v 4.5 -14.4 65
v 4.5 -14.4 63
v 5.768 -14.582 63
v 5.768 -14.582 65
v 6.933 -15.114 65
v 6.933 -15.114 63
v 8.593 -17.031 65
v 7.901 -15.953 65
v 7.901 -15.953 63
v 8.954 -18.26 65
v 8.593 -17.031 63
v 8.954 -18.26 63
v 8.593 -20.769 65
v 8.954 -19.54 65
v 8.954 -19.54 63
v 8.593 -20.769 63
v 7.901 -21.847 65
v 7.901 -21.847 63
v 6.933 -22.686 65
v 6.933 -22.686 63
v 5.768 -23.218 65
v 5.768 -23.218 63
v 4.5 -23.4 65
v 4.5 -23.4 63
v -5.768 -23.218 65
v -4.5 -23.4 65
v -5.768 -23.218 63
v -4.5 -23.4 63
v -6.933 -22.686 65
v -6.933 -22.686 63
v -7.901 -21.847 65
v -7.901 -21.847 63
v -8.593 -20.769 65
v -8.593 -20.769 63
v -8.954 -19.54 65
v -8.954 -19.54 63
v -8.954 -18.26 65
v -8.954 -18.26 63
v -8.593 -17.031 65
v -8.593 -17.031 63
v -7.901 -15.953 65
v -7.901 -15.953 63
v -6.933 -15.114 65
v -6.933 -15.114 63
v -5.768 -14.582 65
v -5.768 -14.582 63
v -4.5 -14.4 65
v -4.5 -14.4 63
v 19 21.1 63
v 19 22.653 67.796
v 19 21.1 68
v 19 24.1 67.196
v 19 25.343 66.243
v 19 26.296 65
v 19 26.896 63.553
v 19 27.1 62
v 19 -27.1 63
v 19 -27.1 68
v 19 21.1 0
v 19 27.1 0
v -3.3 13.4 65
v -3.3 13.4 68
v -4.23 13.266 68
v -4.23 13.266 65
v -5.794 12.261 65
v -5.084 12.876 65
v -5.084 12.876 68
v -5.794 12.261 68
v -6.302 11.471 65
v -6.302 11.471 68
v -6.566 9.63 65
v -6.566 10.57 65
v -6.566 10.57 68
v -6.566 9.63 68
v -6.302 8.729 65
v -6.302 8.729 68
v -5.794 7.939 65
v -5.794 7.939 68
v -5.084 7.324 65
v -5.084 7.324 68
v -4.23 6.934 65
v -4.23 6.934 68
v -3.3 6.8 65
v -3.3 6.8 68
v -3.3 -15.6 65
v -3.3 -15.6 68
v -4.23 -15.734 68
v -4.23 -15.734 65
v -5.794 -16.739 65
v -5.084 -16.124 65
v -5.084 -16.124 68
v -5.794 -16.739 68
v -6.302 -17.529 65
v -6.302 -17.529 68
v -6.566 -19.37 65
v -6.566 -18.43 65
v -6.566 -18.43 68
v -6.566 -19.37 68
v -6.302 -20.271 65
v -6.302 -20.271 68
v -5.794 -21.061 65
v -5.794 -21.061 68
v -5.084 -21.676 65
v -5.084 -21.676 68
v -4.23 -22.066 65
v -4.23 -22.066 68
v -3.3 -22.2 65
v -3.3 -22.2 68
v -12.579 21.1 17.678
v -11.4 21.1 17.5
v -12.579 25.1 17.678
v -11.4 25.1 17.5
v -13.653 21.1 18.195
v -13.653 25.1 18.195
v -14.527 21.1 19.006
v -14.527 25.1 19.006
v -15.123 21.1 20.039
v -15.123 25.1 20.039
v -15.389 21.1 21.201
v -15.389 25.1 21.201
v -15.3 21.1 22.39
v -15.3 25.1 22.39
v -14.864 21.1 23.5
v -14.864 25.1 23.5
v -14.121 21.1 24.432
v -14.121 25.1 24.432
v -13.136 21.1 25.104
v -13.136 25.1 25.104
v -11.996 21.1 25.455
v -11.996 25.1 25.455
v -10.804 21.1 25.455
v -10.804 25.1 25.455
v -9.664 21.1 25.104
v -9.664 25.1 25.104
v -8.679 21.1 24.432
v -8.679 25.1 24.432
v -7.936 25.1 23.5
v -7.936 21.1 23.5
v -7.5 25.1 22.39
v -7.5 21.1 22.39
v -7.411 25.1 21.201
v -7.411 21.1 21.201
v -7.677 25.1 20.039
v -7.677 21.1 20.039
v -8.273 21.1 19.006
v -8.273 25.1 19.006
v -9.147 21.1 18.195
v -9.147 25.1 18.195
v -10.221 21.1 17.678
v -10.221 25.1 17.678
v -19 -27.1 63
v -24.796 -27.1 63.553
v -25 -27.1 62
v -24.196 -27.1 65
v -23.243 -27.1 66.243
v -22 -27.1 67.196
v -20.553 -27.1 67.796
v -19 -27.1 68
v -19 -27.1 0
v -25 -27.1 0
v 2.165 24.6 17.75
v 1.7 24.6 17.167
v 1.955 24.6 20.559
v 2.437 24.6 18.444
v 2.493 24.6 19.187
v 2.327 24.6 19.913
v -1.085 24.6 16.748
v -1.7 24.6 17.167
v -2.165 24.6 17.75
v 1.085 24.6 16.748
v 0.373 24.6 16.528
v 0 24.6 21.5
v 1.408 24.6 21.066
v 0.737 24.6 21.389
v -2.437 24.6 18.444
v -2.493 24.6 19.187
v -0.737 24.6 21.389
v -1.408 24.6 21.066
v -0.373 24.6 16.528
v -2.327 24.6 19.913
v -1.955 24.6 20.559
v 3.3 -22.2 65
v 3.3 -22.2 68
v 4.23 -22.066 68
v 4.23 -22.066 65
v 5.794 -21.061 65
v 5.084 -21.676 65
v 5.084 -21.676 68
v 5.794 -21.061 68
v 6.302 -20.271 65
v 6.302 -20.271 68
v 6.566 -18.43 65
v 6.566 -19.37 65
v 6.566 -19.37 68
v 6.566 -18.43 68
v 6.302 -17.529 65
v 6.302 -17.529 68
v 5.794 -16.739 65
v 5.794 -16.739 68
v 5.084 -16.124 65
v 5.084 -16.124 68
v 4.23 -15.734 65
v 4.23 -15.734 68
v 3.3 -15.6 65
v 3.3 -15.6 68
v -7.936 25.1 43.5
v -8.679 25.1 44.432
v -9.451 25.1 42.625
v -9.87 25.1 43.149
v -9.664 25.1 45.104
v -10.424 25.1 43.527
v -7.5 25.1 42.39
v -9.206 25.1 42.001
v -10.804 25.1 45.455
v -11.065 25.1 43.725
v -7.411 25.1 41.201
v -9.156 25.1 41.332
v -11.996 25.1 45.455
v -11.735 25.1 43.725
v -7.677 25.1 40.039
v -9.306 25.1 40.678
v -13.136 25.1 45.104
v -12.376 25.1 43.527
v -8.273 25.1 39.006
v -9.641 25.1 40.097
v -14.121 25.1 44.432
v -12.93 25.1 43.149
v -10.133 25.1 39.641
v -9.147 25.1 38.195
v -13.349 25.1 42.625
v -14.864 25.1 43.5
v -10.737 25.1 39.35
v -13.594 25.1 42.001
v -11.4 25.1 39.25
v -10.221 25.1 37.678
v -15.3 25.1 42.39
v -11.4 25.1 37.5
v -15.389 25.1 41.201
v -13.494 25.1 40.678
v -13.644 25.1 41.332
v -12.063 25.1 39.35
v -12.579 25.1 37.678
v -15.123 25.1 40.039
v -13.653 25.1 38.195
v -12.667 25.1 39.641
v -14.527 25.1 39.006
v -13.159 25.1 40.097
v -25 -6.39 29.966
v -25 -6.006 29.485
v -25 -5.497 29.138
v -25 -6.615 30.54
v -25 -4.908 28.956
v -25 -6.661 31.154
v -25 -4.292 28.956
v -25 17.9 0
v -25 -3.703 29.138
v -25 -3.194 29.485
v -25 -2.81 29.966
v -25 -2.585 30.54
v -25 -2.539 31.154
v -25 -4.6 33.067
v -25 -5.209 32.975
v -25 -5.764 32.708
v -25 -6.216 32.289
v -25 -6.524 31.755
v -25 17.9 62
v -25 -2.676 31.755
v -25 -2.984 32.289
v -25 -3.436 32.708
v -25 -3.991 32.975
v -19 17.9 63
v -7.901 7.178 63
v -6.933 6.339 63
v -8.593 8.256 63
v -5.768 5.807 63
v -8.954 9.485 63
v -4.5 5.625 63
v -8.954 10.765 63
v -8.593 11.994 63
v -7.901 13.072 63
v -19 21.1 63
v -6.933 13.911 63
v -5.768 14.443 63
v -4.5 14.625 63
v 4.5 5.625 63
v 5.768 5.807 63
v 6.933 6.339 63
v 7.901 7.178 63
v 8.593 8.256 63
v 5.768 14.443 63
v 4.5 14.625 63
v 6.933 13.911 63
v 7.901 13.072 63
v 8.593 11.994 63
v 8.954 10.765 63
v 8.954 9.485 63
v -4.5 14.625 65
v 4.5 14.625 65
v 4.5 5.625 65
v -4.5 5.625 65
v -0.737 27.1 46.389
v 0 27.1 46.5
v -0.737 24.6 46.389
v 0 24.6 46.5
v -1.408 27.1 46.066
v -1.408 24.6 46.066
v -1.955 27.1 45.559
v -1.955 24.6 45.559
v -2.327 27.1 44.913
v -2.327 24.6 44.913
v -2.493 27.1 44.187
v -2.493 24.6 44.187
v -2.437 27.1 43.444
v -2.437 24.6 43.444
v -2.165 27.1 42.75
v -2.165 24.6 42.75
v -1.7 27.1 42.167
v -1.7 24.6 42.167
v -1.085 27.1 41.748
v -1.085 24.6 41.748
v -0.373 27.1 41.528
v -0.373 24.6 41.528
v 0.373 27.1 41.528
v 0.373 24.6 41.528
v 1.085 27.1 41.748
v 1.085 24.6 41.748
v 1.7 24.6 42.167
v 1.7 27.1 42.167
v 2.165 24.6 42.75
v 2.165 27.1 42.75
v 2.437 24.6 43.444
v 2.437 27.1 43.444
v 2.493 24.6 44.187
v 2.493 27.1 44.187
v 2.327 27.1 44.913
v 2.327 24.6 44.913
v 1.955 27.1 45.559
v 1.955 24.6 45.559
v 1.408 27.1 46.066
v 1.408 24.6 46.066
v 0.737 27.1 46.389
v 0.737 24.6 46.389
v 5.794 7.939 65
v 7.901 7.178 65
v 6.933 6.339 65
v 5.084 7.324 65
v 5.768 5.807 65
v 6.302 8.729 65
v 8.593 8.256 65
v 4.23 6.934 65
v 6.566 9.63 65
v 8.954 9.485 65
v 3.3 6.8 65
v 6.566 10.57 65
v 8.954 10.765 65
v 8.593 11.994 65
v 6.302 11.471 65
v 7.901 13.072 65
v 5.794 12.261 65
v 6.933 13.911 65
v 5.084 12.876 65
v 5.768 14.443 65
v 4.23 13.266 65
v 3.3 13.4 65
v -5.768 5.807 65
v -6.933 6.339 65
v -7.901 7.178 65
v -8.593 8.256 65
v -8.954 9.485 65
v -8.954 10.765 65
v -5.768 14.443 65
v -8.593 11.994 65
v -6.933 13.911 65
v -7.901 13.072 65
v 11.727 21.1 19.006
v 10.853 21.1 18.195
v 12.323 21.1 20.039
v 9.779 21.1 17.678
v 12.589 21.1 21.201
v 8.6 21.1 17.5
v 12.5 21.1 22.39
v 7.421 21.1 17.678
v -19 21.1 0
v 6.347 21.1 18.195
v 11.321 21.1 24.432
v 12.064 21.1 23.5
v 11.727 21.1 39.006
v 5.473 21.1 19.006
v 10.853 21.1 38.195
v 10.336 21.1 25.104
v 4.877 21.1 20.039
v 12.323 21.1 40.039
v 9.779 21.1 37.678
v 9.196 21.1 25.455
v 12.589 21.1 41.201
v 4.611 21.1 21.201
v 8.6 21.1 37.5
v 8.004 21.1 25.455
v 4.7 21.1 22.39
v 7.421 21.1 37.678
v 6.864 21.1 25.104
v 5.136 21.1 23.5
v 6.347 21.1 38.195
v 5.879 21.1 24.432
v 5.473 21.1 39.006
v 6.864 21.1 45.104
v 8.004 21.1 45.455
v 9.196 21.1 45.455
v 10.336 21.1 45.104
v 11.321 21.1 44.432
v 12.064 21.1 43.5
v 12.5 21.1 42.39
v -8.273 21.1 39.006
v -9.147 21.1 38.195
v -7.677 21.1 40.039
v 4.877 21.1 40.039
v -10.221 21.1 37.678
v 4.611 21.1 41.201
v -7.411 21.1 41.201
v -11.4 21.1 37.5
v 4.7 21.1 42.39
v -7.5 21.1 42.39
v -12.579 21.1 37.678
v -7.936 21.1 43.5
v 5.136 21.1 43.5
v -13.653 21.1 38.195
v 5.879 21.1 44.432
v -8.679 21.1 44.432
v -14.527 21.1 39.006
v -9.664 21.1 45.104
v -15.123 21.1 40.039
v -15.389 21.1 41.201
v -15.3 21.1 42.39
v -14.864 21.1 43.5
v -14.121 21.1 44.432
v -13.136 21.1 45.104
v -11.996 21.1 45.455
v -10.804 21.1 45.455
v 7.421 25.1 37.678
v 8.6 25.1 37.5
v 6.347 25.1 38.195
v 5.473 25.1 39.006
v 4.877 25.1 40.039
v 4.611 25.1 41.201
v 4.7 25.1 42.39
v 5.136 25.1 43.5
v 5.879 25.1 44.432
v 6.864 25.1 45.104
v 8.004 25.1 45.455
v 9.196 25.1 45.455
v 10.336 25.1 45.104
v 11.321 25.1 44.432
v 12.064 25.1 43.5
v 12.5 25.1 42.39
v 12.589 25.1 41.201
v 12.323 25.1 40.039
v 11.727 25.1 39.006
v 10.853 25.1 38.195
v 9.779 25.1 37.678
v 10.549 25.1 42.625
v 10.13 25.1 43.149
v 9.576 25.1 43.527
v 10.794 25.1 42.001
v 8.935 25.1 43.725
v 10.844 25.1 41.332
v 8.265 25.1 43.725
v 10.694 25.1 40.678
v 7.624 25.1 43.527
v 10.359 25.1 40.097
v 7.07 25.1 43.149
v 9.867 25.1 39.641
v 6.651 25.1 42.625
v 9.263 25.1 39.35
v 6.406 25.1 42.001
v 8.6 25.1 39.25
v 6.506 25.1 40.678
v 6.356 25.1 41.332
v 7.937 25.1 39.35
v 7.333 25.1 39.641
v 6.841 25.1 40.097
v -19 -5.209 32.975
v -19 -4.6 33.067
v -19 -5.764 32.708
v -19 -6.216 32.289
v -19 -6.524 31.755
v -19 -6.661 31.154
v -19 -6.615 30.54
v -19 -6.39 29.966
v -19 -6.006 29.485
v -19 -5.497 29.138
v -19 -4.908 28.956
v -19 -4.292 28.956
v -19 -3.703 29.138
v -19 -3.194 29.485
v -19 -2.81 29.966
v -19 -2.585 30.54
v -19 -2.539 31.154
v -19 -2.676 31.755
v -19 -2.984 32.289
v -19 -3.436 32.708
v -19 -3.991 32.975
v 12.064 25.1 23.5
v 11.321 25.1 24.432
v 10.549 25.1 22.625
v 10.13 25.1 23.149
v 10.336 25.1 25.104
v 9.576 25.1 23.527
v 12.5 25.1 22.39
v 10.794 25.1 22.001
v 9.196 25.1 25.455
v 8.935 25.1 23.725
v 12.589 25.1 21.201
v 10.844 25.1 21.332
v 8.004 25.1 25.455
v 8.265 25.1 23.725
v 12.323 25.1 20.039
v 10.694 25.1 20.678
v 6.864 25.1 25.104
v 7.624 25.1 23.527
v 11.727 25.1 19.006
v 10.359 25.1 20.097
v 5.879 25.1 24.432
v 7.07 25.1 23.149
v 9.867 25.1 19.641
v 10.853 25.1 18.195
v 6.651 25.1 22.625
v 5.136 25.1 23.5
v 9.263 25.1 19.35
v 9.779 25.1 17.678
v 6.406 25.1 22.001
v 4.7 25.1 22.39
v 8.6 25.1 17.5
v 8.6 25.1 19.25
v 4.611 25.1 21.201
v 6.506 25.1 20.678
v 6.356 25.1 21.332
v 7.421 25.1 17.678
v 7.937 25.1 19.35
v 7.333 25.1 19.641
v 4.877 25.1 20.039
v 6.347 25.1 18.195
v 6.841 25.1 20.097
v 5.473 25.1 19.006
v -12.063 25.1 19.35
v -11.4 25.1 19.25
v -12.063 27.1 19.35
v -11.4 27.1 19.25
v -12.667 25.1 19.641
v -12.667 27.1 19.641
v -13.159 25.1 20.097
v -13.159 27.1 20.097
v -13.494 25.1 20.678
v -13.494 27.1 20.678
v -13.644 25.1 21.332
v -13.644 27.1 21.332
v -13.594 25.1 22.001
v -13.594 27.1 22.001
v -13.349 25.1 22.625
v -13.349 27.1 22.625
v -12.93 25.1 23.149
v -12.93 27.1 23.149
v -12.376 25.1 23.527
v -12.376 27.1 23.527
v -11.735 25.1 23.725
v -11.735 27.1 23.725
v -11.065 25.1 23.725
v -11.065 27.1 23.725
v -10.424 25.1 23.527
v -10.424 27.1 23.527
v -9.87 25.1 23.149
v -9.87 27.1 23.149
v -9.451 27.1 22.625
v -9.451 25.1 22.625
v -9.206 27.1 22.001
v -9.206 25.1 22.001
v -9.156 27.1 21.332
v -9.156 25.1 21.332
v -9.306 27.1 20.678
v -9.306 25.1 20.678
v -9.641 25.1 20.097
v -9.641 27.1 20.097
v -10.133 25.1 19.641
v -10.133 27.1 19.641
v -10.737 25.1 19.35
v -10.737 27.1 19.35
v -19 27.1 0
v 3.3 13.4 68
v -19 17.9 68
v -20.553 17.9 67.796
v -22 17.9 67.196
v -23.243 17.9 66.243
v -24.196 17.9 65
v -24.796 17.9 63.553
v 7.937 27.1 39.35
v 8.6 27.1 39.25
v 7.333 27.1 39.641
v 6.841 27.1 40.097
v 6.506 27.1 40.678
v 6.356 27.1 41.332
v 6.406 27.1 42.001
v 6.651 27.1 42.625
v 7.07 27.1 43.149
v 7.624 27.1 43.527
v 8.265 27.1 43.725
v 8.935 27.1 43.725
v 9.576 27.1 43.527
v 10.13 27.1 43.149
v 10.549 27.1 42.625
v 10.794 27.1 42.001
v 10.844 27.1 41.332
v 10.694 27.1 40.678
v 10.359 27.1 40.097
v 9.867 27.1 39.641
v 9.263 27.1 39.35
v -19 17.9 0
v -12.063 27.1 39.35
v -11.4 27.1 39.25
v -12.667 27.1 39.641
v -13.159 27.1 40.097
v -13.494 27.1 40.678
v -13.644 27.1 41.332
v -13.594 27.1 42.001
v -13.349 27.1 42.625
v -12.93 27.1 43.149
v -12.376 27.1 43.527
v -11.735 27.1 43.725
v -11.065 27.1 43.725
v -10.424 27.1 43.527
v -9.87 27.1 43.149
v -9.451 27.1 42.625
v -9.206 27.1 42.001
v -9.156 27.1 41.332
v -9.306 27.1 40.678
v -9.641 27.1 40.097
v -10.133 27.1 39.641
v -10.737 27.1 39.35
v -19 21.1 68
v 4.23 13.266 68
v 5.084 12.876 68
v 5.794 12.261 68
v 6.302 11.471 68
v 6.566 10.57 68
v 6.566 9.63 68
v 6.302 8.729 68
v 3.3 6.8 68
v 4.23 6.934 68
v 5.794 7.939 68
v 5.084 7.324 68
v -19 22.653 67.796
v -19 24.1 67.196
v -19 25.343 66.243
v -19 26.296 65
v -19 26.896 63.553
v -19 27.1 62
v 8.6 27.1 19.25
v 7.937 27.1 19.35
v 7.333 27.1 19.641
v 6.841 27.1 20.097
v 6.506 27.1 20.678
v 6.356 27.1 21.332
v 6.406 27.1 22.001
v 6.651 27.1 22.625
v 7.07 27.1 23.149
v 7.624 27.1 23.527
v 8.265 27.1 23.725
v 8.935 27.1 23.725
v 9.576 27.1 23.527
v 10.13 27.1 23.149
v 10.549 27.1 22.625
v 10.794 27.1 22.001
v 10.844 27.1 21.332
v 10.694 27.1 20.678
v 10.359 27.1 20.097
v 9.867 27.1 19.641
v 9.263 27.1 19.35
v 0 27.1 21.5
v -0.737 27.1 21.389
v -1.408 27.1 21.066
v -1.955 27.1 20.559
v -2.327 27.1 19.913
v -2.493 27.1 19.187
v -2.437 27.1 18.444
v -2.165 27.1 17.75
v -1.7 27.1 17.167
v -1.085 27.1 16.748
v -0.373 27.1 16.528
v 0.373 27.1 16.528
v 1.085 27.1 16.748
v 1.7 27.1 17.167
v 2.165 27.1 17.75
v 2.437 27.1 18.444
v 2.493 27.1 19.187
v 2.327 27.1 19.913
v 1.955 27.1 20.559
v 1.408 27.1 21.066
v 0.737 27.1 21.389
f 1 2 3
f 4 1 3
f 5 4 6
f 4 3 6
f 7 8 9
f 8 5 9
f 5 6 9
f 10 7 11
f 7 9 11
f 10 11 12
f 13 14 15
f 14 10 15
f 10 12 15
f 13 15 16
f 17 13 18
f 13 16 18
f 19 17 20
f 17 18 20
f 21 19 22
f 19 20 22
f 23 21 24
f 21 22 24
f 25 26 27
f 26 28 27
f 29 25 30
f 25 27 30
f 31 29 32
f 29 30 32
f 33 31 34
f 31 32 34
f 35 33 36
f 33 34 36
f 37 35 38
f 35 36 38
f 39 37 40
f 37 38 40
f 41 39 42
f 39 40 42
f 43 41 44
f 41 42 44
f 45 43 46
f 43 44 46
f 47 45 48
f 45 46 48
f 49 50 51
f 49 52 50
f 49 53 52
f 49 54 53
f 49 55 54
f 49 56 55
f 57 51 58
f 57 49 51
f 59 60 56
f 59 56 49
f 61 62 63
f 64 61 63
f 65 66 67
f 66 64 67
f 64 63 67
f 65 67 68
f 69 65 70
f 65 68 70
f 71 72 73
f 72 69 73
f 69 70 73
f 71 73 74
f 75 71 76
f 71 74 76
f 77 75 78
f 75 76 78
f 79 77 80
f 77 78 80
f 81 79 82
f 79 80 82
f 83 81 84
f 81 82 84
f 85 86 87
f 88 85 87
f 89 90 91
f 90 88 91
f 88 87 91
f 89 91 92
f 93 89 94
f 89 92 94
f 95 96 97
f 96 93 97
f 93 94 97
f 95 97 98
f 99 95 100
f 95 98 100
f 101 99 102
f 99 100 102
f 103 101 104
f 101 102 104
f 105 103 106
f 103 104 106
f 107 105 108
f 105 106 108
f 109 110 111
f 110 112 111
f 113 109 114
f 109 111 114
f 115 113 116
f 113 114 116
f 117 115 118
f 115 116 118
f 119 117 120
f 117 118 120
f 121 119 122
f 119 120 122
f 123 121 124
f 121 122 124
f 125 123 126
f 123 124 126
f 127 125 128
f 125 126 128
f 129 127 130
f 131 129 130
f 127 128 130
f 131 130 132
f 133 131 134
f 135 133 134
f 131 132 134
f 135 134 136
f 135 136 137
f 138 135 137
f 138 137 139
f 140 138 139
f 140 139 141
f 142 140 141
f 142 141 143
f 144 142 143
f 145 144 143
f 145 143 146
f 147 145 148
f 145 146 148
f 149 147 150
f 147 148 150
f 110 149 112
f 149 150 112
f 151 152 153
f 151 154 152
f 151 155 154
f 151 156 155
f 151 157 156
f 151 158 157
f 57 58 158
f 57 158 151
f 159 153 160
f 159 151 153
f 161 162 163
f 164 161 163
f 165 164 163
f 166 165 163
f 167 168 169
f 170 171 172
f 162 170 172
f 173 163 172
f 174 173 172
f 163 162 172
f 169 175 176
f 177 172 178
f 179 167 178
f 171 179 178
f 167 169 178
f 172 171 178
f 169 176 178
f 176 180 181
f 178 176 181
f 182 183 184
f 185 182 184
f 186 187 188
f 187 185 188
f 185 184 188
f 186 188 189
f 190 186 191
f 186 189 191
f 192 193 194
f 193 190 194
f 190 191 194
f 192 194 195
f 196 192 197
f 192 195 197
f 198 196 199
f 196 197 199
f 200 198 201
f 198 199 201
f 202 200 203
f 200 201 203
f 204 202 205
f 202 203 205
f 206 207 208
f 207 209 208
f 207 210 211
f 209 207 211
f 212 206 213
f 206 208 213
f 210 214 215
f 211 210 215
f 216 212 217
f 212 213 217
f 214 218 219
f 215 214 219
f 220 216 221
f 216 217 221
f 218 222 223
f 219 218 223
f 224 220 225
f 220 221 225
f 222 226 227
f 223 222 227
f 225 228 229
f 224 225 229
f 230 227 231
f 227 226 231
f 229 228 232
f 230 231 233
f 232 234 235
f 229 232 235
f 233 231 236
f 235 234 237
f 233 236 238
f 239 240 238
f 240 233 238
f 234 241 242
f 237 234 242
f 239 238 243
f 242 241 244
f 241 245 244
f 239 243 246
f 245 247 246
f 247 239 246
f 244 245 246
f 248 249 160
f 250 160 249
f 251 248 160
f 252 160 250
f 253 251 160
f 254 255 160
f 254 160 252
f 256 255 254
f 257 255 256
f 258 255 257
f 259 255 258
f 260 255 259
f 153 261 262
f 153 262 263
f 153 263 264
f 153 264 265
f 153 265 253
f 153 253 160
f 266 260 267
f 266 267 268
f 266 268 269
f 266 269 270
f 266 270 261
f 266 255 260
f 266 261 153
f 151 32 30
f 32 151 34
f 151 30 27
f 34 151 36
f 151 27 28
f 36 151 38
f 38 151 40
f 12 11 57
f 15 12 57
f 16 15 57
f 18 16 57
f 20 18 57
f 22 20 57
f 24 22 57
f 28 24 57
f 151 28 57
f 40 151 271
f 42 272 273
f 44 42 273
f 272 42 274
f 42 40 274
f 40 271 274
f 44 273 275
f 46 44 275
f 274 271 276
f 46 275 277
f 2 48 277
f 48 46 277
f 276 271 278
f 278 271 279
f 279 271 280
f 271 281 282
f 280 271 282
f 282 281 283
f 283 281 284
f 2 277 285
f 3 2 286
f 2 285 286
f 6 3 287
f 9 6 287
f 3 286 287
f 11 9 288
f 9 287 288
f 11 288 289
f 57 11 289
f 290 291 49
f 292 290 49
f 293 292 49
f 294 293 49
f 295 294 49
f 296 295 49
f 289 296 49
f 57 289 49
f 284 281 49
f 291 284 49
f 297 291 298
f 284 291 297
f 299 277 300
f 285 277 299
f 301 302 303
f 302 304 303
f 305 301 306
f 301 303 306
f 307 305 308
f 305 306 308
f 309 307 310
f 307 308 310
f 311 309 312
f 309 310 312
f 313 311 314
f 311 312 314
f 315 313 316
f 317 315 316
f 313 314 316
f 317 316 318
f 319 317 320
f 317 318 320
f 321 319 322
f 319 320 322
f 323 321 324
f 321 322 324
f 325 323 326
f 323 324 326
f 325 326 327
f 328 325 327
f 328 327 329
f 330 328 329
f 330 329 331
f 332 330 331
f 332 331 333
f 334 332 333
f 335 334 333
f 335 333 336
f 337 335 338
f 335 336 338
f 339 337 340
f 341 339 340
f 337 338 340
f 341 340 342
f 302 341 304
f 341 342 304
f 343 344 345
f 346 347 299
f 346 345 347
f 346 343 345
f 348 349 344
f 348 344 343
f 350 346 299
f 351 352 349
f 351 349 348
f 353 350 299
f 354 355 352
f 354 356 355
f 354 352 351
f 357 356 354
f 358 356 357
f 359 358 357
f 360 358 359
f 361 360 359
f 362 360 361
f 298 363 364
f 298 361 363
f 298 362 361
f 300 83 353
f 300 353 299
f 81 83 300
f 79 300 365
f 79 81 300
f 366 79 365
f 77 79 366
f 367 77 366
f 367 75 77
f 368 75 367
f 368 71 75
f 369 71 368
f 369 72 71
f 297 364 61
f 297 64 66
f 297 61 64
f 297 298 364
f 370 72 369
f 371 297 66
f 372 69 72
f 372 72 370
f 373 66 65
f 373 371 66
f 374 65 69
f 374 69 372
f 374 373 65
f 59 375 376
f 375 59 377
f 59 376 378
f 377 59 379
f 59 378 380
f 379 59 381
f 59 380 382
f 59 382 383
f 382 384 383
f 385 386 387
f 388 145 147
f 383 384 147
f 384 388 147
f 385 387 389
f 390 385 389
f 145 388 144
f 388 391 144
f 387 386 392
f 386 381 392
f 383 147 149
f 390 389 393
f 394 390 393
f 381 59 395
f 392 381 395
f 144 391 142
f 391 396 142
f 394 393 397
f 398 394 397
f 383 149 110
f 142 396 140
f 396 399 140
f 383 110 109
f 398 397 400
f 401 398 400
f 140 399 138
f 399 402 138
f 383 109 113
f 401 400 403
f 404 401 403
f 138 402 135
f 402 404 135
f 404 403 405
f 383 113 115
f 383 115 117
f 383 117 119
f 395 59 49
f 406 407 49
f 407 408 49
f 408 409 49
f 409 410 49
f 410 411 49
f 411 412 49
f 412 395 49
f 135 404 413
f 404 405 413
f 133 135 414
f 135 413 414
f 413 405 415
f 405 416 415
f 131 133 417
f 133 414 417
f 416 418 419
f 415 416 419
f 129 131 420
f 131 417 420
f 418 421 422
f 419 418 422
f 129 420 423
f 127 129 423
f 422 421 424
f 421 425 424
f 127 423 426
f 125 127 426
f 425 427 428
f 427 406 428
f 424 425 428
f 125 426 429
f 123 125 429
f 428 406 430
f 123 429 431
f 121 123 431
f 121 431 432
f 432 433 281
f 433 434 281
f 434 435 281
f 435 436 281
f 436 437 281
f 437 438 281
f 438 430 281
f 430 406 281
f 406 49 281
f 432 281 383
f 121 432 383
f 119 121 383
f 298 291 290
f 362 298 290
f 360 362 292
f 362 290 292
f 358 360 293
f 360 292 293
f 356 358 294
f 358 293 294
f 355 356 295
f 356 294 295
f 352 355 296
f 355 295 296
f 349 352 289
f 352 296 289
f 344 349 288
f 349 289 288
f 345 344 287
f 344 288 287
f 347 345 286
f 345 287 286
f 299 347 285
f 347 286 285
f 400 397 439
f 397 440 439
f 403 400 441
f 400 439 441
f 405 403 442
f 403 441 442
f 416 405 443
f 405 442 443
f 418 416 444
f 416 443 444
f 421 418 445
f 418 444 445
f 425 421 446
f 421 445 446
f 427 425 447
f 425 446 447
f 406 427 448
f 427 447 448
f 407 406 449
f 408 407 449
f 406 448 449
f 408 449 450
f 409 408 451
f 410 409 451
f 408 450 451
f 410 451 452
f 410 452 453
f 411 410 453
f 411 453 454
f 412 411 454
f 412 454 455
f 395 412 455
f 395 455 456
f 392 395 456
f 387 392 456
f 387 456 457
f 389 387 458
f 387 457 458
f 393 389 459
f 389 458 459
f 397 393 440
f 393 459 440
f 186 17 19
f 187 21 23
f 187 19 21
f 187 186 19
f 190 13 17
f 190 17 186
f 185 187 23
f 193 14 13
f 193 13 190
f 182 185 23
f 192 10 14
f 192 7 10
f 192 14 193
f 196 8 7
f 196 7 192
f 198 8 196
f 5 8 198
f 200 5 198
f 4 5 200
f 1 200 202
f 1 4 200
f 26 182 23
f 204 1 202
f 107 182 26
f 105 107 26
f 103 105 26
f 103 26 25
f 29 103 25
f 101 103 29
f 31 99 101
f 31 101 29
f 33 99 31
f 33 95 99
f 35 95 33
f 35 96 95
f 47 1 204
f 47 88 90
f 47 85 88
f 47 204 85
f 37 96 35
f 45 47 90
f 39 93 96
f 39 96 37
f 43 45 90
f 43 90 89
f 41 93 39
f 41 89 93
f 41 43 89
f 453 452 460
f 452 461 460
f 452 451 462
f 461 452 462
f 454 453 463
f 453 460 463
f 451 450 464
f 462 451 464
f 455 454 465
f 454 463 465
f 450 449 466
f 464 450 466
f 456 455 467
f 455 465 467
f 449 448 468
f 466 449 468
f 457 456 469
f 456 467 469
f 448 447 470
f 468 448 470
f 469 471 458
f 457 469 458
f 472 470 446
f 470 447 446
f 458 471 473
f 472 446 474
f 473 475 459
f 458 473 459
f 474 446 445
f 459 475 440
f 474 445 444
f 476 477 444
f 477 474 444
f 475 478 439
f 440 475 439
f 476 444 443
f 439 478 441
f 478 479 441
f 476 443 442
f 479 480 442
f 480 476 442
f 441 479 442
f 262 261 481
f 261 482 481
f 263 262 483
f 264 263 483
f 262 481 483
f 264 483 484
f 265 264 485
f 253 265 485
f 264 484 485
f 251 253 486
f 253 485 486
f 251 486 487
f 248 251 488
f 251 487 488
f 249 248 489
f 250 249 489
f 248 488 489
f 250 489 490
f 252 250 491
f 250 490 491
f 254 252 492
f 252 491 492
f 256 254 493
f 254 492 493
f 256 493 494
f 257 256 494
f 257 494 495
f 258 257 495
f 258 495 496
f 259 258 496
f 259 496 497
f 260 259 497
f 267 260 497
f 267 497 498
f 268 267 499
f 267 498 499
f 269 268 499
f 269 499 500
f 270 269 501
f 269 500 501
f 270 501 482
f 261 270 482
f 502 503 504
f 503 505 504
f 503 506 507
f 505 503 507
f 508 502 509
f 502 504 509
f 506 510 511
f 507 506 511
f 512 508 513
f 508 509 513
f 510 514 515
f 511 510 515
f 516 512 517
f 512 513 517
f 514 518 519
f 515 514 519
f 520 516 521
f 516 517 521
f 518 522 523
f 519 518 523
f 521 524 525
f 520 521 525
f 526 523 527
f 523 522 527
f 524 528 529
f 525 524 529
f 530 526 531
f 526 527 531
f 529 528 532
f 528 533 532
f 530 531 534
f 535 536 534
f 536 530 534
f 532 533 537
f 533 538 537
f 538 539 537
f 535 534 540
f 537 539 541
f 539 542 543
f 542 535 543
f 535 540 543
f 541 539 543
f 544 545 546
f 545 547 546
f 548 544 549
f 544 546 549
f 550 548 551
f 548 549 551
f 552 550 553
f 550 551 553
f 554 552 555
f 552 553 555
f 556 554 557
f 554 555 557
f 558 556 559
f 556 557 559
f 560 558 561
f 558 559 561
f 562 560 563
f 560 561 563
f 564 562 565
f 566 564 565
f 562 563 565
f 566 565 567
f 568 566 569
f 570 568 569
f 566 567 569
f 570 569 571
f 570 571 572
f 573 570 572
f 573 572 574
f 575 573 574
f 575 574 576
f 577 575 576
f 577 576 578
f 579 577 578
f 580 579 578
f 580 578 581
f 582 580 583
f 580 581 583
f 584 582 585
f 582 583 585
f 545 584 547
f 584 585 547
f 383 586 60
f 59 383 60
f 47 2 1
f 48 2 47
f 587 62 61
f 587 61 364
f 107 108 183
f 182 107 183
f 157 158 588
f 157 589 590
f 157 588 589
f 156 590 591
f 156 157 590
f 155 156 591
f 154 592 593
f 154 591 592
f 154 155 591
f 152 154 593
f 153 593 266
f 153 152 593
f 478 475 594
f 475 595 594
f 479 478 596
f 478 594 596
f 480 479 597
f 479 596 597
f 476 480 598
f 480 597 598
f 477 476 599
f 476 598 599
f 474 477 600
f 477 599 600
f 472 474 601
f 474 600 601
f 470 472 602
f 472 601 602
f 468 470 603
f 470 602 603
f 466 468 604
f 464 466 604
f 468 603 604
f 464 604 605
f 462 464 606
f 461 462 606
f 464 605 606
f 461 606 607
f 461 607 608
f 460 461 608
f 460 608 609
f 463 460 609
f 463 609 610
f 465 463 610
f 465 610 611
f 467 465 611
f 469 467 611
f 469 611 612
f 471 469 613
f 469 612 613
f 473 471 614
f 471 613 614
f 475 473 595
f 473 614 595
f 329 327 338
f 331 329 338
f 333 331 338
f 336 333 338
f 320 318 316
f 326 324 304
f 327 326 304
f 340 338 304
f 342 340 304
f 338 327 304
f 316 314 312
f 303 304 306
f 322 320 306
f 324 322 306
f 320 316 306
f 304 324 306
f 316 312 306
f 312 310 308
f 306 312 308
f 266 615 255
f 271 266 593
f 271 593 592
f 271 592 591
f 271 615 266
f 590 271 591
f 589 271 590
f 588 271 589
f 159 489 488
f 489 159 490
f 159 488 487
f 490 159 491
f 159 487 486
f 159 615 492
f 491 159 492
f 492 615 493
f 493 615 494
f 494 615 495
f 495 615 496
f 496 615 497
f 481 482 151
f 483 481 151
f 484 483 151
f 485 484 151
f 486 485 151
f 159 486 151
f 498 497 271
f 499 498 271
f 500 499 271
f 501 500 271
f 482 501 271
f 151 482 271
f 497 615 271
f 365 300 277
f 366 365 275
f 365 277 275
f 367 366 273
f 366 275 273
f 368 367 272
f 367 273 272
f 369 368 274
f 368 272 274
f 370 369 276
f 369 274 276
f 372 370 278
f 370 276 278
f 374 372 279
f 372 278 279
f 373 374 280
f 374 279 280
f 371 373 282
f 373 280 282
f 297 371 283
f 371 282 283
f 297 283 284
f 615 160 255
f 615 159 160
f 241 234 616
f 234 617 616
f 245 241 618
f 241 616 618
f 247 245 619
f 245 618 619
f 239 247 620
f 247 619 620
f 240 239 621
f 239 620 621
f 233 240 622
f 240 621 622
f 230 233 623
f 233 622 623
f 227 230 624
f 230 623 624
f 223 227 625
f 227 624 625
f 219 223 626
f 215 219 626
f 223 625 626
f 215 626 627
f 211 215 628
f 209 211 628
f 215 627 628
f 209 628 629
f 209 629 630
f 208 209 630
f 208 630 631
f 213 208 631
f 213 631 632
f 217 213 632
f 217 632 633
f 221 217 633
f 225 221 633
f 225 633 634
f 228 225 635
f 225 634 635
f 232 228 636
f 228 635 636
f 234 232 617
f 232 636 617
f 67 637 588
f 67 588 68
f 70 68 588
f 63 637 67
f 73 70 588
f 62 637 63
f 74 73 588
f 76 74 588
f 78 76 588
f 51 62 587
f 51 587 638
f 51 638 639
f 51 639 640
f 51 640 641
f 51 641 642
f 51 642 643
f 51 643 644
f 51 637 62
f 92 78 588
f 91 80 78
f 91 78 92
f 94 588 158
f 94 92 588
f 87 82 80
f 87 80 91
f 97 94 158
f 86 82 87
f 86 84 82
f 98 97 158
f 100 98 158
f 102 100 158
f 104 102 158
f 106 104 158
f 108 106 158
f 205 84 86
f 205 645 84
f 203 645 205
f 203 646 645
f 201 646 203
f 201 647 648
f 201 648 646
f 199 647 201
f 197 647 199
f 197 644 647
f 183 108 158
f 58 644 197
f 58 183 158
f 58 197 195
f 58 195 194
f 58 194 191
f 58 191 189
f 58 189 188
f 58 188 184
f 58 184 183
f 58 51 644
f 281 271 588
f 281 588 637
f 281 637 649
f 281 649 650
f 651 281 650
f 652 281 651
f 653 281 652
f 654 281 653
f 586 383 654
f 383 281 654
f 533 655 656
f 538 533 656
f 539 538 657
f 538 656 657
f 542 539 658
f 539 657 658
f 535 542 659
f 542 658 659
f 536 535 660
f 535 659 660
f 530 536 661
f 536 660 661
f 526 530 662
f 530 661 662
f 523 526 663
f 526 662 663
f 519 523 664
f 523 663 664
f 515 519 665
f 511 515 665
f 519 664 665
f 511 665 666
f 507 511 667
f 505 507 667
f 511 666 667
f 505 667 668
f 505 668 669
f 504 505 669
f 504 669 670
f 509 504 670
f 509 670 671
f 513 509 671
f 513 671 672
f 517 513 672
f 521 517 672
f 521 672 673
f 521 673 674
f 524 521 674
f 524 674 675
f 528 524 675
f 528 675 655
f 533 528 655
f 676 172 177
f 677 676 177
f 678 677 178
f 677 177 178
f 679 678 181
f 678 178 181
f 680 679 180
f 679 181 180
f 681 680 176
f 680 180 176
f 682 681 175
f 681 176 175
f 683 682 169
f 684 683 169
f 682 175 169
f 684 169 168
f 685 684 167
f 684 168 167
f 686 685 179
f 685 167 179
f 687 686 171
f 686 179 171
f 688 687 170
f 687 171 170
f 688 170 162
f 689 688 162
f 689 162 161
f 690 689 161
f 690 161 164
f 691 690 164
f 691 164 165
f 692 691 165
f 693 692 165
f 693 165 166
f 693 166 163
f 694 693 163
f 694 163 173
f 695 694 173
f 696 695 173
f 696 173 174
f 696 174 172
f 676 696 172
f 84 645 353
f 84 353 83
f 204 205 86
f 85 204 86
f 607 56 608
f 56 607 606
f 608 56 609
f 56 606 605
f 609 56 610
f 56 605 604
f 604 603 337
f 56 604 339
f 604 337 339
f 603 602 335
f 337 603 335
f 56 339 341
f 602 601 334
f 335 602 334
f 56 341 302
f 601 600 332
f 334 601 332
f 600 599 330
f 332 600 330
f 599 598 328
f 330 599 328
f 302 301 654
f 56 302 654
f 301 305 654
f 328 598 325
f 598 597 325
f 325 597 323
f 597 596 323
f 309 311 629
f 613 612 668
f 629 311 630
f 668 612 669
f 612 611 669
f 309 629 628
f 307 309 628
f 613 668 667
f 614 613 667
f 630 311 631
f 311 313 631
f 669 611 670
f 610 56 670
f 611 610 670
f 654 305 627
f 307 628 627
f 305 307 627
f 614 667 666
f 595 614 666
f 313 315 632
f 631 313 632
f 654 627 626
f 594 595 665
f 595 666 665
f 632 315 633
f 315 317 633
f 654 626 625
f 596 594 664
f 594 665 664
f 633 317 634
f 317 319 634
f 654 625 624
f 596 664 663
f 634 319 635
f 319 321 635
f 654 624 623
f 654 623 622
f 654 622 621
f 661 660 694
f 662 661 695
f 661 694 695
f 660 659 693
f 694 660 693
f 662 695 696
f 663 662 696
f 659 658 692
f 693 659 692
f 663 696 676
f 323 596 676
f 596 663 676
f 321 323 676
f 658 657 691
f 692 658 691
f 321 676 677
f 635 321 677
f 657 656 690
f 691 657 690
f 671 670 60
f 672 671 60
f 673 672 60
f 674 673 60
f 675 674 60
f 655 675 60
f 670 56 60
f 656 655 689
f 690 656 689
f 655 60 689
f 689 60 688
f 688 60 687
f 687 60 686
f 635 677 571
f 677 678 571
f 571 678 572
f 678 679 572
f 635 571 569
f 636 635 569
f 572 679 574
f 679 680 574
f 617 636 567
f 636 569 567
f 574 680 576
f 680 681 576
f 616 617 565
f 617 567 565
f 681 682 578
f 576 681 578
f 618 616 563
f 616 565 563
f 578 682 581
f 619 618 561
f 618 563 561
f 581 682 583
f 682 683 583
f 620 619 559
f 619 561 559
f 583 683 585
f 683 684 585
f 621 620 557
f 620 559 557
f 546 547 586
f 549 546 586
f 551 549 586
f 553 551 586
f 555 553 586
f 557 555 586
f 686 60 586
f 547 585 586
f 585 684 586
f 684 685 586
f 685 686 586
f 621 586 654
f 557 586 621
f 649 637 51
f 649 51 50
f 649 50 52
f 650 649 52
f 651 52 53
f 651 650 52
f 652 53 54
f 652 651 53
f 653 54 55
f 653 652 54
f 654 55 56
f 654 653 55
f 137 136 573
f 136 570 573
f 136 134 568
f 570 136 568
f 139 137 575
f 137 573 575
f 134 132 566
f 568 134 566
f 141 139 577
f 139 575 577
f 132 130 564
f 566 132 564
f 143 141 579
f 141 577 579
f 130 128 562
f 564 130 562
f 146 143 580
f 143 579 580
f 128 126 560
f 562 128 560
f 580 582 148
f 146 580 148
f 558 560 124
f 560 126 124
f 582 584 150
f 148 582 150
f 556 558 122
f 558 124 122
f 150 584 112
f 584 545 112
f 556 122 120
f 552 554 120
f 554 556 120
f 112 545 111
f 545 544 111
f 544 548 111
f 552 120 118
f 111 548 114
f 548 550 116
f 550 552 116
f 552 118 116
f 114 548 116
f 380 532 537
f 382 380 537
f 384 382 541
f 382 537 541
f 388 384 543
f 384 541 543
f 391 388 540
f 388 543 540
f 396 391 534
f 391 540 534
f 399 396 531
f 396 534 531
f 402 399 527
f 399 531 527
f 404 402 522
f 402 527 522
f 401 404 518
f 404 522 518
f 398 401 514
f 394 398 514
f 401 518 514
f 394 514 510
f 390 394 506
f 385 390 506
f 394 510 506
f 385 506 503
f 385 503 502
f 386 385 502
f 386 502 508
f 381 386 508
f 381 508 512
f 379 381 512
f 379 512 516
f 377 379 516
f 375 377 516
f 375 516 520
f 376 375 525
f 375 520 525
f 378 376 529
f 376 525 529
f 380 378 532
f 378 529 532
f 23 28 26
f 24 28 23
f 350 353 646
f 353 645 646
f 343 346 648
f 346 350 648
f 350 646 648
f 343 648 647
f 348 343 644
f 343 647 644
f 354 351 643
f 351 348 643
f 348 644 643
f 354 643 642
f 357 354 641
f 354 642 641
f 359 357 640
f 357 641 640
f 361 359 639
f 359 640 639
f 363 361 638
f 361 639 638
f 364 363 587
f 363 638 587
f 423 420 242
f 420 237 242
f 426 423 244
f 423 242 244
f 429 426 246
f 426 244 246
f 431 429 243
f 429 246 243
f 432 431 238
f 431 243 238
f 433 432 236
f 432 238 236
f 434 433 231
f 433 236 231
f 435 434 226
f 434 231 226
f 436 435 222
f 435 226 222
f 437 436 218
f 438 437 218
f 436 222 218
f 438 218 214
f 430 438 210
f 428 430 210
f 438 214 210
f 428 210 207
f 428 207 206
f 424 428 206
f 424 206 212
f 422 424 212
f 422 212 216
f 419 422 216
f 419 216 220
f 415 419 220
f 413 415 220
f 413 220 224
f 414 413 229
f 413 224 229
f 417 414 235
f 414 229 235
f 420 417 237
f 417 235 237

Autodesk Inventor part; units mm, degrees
ref_plane "YZ Plane" through (0, 0, 0) normal (1, 0, 0) x (0, 1, 0)
ref_plane "XZ Plane" through (0, 0, 0) normal (0, 1, 0) x (-1, 0, 0)
ref_plane "XY Plane" through (0, 0, 0) normal (0, 0, 1) x (1, 0, 0)
sketch "Skizze1" plane through (0, 0, 0) normal (0, 0, 1) x (1, 0, 0)
  line L0 (-19, 27.1) -> (19, 27.1)
  line L1 (19, 27.1) -> (19, -27.1)
  line L2 (19, -27.1) -> (-19, -27.1)
  line L3 (-19, -27.1) -> (-19, 27.1)
  line L4 (0, 37.94) -> (0, -37.94) projected
  line L5 (-26.6, 0) -> (26.6, 0) projected
  point P0 (0, 0)
  dimension "d0" = 38
  dimension "d1" = 54.2
  dimension "d46" = 19
  dimension "d47" = 27.1
extrude "Extrusion1" add sketch "Skizze1" along normal blind 63
sketch "Skizze2" plane through (0, 0, 63) normal (0, 0, 1) x (1, 0, 0)
  line L0 (-19, -27.1) -> (19, -27.1) projected
  line L1 (-19, -27.1) -> (19, -27.1)
  line L2 (19, -27.1) -> (19, 21.1)
  line L3 (19, 21.1) -> (-19, 21.1)
  line L4 (-19, 21.1) -> (-19, -27.1)
  line L5 (-19, 27.1) -> (-19, -27.1) projected
  line L6 (19, 27.1) -> (-19, 27.1) projected
  point P0 (0, 0)
  dimension "d4" = 38
  dimension "d6" = 6
extrude "Extrusion2" cut sketch "Skizze2" against normal through all
sketch "Skizze6" plane through (-19, 27.1, 0) normal (0, 1, 0) x (1, 0, 0)
  line L0 (38, -63) -> (0, -63) projected
  line L1 (38, 0) -> (0, 0) projected
  line L2 (19, 12.6) -> (19, -75.6) projected
  point P0 (19, 0)
  point P1 (19, -44)
  point P2 (19, -19)
  dimension "d48" = 25
  dimension "d49" = 63
  dimension "d50" = 19
hole "Bohrung4" at (0, 27.1, 44) at (0, 27.1, 19) direction (0, -1, 0) diameter 5 depth 2.5
sketch "Skizze13" plane through (-19, 21.1, 63) normal (0, -1, 0) x (1, 0, 0)
  line L0 (38, 0) -> (38, -63) projected
  line L1 (0, -63) -> (0, 0) projected
  line L2 (38, -63) -> (0, -63) projected
  line L3 (0, 0) -> (38, 0) projected
  point P0 (19, -63)
  point P1 (7.6, -21.5)
  point P2 (27.6, -21.5)
  point P3 (27.6, -41.5)
  point P4 (7.6, -41.5)
  dimension "d102" = 20
  dimension "d103" = 20
  dimension "d104" = 38
  dimension "d105" = 7.6
  dimension "d106" = 63
  dimension "d107" = 21.5
hole "Bohrung6" at (-11.4, 21.1, 41.5) at (8.6, 21.1, 41.5) at (8.6, 21.1, 21.5) at (-11.4, 21.1, 21.5) direction (0, 1, 0) diameter 4.5 end through all counterbore diameter 8 counterbore depth 4 clearance for "Innensechskantkopfschraube" size "M4" standard "ANSI Metrisches M Profil"
sketch "Skizze14" plane through (0, 0, 63) normal (0, 0, 1) x (1, 0, 0)
  line L0 (19, 27.1) -> (-19, 27.1) projected
  line L1 (-19, 27.1) -> (19, 27.1)
  line L2 (19, 27.1) -> (19, -27.1)
  line L3 (19, -27.1) -> (-19, -27.1)
  line L4 (-19, -27.1) -> (-19, 27.1)
  line L5 (19, 21.1) -> (19, 27.1) projected
  point P0 (0, 0)
  dimension "d115" = 54.2
extrude "Extrusion8" add sketch "Skizze14" along normal blind 5
sketch "Skizze15" plane through (0, 0, 68) normal (0, 0, -1) x (-1, 0, 0)
  line L0 (-19, 21.1) -> (19, 21.1) projected
  line L1 (3.3, 13.4) -> (-3.3, 13.4)
  line L2 (-3.3, 13.4) -> (-3.3, 6.8)
  line L3 (-3.3, 6.8) -> (3.3, 6.8)
  line L4 (3.3, 6.8) -> (3.3, 13.4)
  line L5 (3.3, 13.4) -> (-3.3, 6.8) construction
  line L6 (-3.3, 13.4) -> (3.3, 6.8) construction
  arc A0 (3.3, 6.8) -> (3.3, 13.4) centre (3.3, 10.1) ccw
  arc A1 (-3.3, 13.4) -> (-3.3, 6.8) centre (-3.3, 10.1) ccw
  line L7 (3.3, -22.2) -> (-3.3, -22.2)
  line L8 (-3.3, -22.2) -> (-3.3, -15.6)
  line L9 (-3.3, -15.6) -> (3.3, -15.6)
  line L10 (3.3, -15.6) -> (3.3, -22.2)
  line L11 (3.3, -22.2) -> (-3.3, -15.6) construction
  line L12 (-3.3, -22.2) -> (3.3, -15.6) construction
  arc A2 (3.3, -22.2) -> (3.3, -15.6) centre (3.3, -18.9) ccw
  arc A3 (-3.3, -15.6) -> (-3.3, -22.2) centre (-3.3, -18.9) ccw
  point P0 (0, 0)
  point P1 (0, 10.1)
  point P2 (0, -18.9)
  dimension "d118" = 11
  dimension "d119" = 29
  dimension "d149" = 6.6
  dimension "d150" = 6.6
  dimension "d151" = 6.6
  dimension "d152" = 6.6
  dimension "d153" = 3.3
sketch "Sketch17" plane through (19, 21.1, 0) normal (1, 0, 0) x (0, 0, -1)
  line L0 (-68, -48.2) -> (0, -48.2)
  line L1 (0, -48.2) -> (0, -1)
  line L2 (0, -1) -> (-68, -1)
  line L3 (-68, -1) -> (-68, -48.2)
  line L4 (-63, 0) -> (0, 0) projected
  dimension "d137" = 1
extrude "Extrusion9" [suppressed]
sketch "Sketch21" plane through (-19, 21.1, 0) normal (-1, 0, 0) x (0, 0, 1)
  line L0 (63, -48.2) -> (68, -48.2) projected
  line L1 (68, -48.2) -> (0, -48.2)
  line L2 (0, -48.2) -> (0, -3.2)
  line L3 (0, -3.2) -> (68, -3.2)
  line L4 (68, -3.2) -> (68, -48.2)
  point P0 (0, -21.1)
  dimension "d170" = 45
extrude "Extrusion12" add sketch "Sketch21" along normal blind 6
fillet "Fillet2" radius 6 2 edges at (0, 27.1, 68) (-25, -4.6, 68)
extrude "Extrusion10" cut sketch "Skizze15" along normal blind 6
sketch "Sketch19" plane through (0, 0, 63) normal (0, 0, -1) x (-1, 0, 0)
  arc A0 (3.3, -22.2) -> (3.3, -15.6) centre (3.3, -18.9) ccw projected
  line L0 (3.3, -22.2) -> (-3.3, -22.2) projected
  arc A1 (-3.3, -15.6) -> (-3.3, -22.2) centre (-3.3, -18.9) ccw projected
  line L1 (-3.3, -15.6) -> (3.3, -15.6) projected
  line L2 (-3.3, 13.4) -> (3.3, 13.4) projected
  arc A2 (3.3, 6.8) -> (3.3, 13.4) centre (3.3, 10.1) ccw projected
  line L3 (3.3, 6.8) -> (-3.3, 6.8) projected
  arc A3 (-3.3, 13.4) -> (-3.3, 6.8) centre (-3.3, 10.1) ccw projected
  line L4 (19, 21.1) -> (-19, 21.1) projected
  line L5 (-19, -27.1) -> (-19, 21.1) projected
  line L6 (19, -27.1) -> (-19, -27.1) projected
  line L7 (19, 21.1) -> (19, 17.9) projected
  line L8 (-9.0001, 14.625) -> (8.9999, 14.625)
  line L9 (8.9999, 14.625) -> (8.9999, 5.625)
  line L10 (8.9999, 5.625) -> (-9.0001, 5.625)
  line L11 (-9.0001, 5.625) -> (-9.0001, 14.625)
  line L12 (-9.0001, 14.625) -> (8.9999, 5.625) construction
  line L13 (8.9999, 14.625) -> (-9.0001, 5.625) construction
  circle A4 centre (4.4999, 10.125) radius 4.5
  circle A5 centre (-4.5001, 10.125) radius 4.5
  line L14 (-9.0001, -14.4) -> (8.9999, -14.4)
  line L15 (8.9999, -14.4) -> (8.9999, -23.4)
  line L16 (8.9999, -23.4) -> (-9.0001, -23.4)
  line L17 (-9.0001, -23.4) -> (-9.0001, -14.4)
  line L18 (-9.0001, -14.4) -> (8.9999, -23.4) construction
  line L19 (8.9999, -14.4) -> (-9.0001, -23.4) construction
  circle A6 centre (4.4999, -18.9) radius 4.5
  circle A7 centre (-4.5001, -18.9) radius 4.5
  arc A8 (-3.3, -15.6) -> (-3.3, -22.2) centre (-3.3, -18.9) ccw projected
  line L20 (19, 17.9) -> (19, -27.1) projected
  point P0 (0, 0)
  point P1 (-0.0001, 10.125)
  point P2 (-0.1415, -24.1318)
  point P3 (-0.0001, -18.9)
  point P4 (-0.1415, -22.2)
  point P5 (-4.5001, -23.4)
  point P6 (4.4999, -23.4)
  point P7 (4.4999, -14.4)
  point P8 (-4.5001, -14.4)
  point P9 (-4.5001, 5.625)
  point P10 (4.4999, 5.625)
  point P11 (4.4999, 14.625)
  point P12 (-4.5001, 14.625)
  dimension "d156" = 18
  dimension "d157" = 9
  dimension "d158" = 9
  dimension "d160" = 18
  dimension "d161" = 9
  dimension "d162" = 9
  dimension "d165" = 9
  dimension "d166" = 1.2001
  dimension "d167" = 1.2001
extrude "Extrusion11" cut sketch "Sketch19" against normal blind 2 contours A0 L1 A6 L0 | A6 L16 A7 L0 | L1 A7 L14 A6 | A7 L1 A1 L0 | A3 L3 A5 L2 | A5 L8 A4 L2 | A4 L3 A2 L2 | L3 A4 L10 A5 picked at (8.1543, -18.4336) picked at (-8.1544, -18.4336) picked at (-8.1544, 10.583) picked at (8.1543, 10.583)
sketch "Sketch22" plane through (-25, 21.1, 0) normal (-1, 0, 0) x (0, 0, 1)
  line L0 (0, -48.2) -> (62, -48.2) projected
  point P0 (0, -21.1)
  point P1 (31, -25.7)
  point P2 (31, -48.2)
  dimension "d173" = 0
  dimension "d174" = 22.5
sketch "Sketch18" plane through (25, 21.1, 0) normal (1, 0, 0) x (0, 0, -1)
  line L0 (-62, -48.2) -> (0, -48.2) projected
  line L1 (0, -1) -> (-62, -1) projected
  point P0 (0, -21.1)
  point P1 (-34.0313, -24.6)
  dimension "d139" = 23.6
  dimension "d140" = 47.2
hole "Hole9" [suppressed]
hole "Hole10" at (-25, -4.6, 31) direction (1, 0, 0) diameter 4.134 end through all thread size "M5x0.8" class "6H" standard "ISO Metric profile"
equation "\"d46\" = 0.5 * d0"
equation "\"d47\" = 0.5 * d1"
equation "\"d50\" = -0.5 * d48 + 0.5 * d49"
equation "\"d107\" = -0.5 * d103 + 0.5 * d106"
equation "\"d167\" = d166"
equation "\"d139\" = 0.5 * d140"
properties part number "TS_Adapter_Greifer_int"
